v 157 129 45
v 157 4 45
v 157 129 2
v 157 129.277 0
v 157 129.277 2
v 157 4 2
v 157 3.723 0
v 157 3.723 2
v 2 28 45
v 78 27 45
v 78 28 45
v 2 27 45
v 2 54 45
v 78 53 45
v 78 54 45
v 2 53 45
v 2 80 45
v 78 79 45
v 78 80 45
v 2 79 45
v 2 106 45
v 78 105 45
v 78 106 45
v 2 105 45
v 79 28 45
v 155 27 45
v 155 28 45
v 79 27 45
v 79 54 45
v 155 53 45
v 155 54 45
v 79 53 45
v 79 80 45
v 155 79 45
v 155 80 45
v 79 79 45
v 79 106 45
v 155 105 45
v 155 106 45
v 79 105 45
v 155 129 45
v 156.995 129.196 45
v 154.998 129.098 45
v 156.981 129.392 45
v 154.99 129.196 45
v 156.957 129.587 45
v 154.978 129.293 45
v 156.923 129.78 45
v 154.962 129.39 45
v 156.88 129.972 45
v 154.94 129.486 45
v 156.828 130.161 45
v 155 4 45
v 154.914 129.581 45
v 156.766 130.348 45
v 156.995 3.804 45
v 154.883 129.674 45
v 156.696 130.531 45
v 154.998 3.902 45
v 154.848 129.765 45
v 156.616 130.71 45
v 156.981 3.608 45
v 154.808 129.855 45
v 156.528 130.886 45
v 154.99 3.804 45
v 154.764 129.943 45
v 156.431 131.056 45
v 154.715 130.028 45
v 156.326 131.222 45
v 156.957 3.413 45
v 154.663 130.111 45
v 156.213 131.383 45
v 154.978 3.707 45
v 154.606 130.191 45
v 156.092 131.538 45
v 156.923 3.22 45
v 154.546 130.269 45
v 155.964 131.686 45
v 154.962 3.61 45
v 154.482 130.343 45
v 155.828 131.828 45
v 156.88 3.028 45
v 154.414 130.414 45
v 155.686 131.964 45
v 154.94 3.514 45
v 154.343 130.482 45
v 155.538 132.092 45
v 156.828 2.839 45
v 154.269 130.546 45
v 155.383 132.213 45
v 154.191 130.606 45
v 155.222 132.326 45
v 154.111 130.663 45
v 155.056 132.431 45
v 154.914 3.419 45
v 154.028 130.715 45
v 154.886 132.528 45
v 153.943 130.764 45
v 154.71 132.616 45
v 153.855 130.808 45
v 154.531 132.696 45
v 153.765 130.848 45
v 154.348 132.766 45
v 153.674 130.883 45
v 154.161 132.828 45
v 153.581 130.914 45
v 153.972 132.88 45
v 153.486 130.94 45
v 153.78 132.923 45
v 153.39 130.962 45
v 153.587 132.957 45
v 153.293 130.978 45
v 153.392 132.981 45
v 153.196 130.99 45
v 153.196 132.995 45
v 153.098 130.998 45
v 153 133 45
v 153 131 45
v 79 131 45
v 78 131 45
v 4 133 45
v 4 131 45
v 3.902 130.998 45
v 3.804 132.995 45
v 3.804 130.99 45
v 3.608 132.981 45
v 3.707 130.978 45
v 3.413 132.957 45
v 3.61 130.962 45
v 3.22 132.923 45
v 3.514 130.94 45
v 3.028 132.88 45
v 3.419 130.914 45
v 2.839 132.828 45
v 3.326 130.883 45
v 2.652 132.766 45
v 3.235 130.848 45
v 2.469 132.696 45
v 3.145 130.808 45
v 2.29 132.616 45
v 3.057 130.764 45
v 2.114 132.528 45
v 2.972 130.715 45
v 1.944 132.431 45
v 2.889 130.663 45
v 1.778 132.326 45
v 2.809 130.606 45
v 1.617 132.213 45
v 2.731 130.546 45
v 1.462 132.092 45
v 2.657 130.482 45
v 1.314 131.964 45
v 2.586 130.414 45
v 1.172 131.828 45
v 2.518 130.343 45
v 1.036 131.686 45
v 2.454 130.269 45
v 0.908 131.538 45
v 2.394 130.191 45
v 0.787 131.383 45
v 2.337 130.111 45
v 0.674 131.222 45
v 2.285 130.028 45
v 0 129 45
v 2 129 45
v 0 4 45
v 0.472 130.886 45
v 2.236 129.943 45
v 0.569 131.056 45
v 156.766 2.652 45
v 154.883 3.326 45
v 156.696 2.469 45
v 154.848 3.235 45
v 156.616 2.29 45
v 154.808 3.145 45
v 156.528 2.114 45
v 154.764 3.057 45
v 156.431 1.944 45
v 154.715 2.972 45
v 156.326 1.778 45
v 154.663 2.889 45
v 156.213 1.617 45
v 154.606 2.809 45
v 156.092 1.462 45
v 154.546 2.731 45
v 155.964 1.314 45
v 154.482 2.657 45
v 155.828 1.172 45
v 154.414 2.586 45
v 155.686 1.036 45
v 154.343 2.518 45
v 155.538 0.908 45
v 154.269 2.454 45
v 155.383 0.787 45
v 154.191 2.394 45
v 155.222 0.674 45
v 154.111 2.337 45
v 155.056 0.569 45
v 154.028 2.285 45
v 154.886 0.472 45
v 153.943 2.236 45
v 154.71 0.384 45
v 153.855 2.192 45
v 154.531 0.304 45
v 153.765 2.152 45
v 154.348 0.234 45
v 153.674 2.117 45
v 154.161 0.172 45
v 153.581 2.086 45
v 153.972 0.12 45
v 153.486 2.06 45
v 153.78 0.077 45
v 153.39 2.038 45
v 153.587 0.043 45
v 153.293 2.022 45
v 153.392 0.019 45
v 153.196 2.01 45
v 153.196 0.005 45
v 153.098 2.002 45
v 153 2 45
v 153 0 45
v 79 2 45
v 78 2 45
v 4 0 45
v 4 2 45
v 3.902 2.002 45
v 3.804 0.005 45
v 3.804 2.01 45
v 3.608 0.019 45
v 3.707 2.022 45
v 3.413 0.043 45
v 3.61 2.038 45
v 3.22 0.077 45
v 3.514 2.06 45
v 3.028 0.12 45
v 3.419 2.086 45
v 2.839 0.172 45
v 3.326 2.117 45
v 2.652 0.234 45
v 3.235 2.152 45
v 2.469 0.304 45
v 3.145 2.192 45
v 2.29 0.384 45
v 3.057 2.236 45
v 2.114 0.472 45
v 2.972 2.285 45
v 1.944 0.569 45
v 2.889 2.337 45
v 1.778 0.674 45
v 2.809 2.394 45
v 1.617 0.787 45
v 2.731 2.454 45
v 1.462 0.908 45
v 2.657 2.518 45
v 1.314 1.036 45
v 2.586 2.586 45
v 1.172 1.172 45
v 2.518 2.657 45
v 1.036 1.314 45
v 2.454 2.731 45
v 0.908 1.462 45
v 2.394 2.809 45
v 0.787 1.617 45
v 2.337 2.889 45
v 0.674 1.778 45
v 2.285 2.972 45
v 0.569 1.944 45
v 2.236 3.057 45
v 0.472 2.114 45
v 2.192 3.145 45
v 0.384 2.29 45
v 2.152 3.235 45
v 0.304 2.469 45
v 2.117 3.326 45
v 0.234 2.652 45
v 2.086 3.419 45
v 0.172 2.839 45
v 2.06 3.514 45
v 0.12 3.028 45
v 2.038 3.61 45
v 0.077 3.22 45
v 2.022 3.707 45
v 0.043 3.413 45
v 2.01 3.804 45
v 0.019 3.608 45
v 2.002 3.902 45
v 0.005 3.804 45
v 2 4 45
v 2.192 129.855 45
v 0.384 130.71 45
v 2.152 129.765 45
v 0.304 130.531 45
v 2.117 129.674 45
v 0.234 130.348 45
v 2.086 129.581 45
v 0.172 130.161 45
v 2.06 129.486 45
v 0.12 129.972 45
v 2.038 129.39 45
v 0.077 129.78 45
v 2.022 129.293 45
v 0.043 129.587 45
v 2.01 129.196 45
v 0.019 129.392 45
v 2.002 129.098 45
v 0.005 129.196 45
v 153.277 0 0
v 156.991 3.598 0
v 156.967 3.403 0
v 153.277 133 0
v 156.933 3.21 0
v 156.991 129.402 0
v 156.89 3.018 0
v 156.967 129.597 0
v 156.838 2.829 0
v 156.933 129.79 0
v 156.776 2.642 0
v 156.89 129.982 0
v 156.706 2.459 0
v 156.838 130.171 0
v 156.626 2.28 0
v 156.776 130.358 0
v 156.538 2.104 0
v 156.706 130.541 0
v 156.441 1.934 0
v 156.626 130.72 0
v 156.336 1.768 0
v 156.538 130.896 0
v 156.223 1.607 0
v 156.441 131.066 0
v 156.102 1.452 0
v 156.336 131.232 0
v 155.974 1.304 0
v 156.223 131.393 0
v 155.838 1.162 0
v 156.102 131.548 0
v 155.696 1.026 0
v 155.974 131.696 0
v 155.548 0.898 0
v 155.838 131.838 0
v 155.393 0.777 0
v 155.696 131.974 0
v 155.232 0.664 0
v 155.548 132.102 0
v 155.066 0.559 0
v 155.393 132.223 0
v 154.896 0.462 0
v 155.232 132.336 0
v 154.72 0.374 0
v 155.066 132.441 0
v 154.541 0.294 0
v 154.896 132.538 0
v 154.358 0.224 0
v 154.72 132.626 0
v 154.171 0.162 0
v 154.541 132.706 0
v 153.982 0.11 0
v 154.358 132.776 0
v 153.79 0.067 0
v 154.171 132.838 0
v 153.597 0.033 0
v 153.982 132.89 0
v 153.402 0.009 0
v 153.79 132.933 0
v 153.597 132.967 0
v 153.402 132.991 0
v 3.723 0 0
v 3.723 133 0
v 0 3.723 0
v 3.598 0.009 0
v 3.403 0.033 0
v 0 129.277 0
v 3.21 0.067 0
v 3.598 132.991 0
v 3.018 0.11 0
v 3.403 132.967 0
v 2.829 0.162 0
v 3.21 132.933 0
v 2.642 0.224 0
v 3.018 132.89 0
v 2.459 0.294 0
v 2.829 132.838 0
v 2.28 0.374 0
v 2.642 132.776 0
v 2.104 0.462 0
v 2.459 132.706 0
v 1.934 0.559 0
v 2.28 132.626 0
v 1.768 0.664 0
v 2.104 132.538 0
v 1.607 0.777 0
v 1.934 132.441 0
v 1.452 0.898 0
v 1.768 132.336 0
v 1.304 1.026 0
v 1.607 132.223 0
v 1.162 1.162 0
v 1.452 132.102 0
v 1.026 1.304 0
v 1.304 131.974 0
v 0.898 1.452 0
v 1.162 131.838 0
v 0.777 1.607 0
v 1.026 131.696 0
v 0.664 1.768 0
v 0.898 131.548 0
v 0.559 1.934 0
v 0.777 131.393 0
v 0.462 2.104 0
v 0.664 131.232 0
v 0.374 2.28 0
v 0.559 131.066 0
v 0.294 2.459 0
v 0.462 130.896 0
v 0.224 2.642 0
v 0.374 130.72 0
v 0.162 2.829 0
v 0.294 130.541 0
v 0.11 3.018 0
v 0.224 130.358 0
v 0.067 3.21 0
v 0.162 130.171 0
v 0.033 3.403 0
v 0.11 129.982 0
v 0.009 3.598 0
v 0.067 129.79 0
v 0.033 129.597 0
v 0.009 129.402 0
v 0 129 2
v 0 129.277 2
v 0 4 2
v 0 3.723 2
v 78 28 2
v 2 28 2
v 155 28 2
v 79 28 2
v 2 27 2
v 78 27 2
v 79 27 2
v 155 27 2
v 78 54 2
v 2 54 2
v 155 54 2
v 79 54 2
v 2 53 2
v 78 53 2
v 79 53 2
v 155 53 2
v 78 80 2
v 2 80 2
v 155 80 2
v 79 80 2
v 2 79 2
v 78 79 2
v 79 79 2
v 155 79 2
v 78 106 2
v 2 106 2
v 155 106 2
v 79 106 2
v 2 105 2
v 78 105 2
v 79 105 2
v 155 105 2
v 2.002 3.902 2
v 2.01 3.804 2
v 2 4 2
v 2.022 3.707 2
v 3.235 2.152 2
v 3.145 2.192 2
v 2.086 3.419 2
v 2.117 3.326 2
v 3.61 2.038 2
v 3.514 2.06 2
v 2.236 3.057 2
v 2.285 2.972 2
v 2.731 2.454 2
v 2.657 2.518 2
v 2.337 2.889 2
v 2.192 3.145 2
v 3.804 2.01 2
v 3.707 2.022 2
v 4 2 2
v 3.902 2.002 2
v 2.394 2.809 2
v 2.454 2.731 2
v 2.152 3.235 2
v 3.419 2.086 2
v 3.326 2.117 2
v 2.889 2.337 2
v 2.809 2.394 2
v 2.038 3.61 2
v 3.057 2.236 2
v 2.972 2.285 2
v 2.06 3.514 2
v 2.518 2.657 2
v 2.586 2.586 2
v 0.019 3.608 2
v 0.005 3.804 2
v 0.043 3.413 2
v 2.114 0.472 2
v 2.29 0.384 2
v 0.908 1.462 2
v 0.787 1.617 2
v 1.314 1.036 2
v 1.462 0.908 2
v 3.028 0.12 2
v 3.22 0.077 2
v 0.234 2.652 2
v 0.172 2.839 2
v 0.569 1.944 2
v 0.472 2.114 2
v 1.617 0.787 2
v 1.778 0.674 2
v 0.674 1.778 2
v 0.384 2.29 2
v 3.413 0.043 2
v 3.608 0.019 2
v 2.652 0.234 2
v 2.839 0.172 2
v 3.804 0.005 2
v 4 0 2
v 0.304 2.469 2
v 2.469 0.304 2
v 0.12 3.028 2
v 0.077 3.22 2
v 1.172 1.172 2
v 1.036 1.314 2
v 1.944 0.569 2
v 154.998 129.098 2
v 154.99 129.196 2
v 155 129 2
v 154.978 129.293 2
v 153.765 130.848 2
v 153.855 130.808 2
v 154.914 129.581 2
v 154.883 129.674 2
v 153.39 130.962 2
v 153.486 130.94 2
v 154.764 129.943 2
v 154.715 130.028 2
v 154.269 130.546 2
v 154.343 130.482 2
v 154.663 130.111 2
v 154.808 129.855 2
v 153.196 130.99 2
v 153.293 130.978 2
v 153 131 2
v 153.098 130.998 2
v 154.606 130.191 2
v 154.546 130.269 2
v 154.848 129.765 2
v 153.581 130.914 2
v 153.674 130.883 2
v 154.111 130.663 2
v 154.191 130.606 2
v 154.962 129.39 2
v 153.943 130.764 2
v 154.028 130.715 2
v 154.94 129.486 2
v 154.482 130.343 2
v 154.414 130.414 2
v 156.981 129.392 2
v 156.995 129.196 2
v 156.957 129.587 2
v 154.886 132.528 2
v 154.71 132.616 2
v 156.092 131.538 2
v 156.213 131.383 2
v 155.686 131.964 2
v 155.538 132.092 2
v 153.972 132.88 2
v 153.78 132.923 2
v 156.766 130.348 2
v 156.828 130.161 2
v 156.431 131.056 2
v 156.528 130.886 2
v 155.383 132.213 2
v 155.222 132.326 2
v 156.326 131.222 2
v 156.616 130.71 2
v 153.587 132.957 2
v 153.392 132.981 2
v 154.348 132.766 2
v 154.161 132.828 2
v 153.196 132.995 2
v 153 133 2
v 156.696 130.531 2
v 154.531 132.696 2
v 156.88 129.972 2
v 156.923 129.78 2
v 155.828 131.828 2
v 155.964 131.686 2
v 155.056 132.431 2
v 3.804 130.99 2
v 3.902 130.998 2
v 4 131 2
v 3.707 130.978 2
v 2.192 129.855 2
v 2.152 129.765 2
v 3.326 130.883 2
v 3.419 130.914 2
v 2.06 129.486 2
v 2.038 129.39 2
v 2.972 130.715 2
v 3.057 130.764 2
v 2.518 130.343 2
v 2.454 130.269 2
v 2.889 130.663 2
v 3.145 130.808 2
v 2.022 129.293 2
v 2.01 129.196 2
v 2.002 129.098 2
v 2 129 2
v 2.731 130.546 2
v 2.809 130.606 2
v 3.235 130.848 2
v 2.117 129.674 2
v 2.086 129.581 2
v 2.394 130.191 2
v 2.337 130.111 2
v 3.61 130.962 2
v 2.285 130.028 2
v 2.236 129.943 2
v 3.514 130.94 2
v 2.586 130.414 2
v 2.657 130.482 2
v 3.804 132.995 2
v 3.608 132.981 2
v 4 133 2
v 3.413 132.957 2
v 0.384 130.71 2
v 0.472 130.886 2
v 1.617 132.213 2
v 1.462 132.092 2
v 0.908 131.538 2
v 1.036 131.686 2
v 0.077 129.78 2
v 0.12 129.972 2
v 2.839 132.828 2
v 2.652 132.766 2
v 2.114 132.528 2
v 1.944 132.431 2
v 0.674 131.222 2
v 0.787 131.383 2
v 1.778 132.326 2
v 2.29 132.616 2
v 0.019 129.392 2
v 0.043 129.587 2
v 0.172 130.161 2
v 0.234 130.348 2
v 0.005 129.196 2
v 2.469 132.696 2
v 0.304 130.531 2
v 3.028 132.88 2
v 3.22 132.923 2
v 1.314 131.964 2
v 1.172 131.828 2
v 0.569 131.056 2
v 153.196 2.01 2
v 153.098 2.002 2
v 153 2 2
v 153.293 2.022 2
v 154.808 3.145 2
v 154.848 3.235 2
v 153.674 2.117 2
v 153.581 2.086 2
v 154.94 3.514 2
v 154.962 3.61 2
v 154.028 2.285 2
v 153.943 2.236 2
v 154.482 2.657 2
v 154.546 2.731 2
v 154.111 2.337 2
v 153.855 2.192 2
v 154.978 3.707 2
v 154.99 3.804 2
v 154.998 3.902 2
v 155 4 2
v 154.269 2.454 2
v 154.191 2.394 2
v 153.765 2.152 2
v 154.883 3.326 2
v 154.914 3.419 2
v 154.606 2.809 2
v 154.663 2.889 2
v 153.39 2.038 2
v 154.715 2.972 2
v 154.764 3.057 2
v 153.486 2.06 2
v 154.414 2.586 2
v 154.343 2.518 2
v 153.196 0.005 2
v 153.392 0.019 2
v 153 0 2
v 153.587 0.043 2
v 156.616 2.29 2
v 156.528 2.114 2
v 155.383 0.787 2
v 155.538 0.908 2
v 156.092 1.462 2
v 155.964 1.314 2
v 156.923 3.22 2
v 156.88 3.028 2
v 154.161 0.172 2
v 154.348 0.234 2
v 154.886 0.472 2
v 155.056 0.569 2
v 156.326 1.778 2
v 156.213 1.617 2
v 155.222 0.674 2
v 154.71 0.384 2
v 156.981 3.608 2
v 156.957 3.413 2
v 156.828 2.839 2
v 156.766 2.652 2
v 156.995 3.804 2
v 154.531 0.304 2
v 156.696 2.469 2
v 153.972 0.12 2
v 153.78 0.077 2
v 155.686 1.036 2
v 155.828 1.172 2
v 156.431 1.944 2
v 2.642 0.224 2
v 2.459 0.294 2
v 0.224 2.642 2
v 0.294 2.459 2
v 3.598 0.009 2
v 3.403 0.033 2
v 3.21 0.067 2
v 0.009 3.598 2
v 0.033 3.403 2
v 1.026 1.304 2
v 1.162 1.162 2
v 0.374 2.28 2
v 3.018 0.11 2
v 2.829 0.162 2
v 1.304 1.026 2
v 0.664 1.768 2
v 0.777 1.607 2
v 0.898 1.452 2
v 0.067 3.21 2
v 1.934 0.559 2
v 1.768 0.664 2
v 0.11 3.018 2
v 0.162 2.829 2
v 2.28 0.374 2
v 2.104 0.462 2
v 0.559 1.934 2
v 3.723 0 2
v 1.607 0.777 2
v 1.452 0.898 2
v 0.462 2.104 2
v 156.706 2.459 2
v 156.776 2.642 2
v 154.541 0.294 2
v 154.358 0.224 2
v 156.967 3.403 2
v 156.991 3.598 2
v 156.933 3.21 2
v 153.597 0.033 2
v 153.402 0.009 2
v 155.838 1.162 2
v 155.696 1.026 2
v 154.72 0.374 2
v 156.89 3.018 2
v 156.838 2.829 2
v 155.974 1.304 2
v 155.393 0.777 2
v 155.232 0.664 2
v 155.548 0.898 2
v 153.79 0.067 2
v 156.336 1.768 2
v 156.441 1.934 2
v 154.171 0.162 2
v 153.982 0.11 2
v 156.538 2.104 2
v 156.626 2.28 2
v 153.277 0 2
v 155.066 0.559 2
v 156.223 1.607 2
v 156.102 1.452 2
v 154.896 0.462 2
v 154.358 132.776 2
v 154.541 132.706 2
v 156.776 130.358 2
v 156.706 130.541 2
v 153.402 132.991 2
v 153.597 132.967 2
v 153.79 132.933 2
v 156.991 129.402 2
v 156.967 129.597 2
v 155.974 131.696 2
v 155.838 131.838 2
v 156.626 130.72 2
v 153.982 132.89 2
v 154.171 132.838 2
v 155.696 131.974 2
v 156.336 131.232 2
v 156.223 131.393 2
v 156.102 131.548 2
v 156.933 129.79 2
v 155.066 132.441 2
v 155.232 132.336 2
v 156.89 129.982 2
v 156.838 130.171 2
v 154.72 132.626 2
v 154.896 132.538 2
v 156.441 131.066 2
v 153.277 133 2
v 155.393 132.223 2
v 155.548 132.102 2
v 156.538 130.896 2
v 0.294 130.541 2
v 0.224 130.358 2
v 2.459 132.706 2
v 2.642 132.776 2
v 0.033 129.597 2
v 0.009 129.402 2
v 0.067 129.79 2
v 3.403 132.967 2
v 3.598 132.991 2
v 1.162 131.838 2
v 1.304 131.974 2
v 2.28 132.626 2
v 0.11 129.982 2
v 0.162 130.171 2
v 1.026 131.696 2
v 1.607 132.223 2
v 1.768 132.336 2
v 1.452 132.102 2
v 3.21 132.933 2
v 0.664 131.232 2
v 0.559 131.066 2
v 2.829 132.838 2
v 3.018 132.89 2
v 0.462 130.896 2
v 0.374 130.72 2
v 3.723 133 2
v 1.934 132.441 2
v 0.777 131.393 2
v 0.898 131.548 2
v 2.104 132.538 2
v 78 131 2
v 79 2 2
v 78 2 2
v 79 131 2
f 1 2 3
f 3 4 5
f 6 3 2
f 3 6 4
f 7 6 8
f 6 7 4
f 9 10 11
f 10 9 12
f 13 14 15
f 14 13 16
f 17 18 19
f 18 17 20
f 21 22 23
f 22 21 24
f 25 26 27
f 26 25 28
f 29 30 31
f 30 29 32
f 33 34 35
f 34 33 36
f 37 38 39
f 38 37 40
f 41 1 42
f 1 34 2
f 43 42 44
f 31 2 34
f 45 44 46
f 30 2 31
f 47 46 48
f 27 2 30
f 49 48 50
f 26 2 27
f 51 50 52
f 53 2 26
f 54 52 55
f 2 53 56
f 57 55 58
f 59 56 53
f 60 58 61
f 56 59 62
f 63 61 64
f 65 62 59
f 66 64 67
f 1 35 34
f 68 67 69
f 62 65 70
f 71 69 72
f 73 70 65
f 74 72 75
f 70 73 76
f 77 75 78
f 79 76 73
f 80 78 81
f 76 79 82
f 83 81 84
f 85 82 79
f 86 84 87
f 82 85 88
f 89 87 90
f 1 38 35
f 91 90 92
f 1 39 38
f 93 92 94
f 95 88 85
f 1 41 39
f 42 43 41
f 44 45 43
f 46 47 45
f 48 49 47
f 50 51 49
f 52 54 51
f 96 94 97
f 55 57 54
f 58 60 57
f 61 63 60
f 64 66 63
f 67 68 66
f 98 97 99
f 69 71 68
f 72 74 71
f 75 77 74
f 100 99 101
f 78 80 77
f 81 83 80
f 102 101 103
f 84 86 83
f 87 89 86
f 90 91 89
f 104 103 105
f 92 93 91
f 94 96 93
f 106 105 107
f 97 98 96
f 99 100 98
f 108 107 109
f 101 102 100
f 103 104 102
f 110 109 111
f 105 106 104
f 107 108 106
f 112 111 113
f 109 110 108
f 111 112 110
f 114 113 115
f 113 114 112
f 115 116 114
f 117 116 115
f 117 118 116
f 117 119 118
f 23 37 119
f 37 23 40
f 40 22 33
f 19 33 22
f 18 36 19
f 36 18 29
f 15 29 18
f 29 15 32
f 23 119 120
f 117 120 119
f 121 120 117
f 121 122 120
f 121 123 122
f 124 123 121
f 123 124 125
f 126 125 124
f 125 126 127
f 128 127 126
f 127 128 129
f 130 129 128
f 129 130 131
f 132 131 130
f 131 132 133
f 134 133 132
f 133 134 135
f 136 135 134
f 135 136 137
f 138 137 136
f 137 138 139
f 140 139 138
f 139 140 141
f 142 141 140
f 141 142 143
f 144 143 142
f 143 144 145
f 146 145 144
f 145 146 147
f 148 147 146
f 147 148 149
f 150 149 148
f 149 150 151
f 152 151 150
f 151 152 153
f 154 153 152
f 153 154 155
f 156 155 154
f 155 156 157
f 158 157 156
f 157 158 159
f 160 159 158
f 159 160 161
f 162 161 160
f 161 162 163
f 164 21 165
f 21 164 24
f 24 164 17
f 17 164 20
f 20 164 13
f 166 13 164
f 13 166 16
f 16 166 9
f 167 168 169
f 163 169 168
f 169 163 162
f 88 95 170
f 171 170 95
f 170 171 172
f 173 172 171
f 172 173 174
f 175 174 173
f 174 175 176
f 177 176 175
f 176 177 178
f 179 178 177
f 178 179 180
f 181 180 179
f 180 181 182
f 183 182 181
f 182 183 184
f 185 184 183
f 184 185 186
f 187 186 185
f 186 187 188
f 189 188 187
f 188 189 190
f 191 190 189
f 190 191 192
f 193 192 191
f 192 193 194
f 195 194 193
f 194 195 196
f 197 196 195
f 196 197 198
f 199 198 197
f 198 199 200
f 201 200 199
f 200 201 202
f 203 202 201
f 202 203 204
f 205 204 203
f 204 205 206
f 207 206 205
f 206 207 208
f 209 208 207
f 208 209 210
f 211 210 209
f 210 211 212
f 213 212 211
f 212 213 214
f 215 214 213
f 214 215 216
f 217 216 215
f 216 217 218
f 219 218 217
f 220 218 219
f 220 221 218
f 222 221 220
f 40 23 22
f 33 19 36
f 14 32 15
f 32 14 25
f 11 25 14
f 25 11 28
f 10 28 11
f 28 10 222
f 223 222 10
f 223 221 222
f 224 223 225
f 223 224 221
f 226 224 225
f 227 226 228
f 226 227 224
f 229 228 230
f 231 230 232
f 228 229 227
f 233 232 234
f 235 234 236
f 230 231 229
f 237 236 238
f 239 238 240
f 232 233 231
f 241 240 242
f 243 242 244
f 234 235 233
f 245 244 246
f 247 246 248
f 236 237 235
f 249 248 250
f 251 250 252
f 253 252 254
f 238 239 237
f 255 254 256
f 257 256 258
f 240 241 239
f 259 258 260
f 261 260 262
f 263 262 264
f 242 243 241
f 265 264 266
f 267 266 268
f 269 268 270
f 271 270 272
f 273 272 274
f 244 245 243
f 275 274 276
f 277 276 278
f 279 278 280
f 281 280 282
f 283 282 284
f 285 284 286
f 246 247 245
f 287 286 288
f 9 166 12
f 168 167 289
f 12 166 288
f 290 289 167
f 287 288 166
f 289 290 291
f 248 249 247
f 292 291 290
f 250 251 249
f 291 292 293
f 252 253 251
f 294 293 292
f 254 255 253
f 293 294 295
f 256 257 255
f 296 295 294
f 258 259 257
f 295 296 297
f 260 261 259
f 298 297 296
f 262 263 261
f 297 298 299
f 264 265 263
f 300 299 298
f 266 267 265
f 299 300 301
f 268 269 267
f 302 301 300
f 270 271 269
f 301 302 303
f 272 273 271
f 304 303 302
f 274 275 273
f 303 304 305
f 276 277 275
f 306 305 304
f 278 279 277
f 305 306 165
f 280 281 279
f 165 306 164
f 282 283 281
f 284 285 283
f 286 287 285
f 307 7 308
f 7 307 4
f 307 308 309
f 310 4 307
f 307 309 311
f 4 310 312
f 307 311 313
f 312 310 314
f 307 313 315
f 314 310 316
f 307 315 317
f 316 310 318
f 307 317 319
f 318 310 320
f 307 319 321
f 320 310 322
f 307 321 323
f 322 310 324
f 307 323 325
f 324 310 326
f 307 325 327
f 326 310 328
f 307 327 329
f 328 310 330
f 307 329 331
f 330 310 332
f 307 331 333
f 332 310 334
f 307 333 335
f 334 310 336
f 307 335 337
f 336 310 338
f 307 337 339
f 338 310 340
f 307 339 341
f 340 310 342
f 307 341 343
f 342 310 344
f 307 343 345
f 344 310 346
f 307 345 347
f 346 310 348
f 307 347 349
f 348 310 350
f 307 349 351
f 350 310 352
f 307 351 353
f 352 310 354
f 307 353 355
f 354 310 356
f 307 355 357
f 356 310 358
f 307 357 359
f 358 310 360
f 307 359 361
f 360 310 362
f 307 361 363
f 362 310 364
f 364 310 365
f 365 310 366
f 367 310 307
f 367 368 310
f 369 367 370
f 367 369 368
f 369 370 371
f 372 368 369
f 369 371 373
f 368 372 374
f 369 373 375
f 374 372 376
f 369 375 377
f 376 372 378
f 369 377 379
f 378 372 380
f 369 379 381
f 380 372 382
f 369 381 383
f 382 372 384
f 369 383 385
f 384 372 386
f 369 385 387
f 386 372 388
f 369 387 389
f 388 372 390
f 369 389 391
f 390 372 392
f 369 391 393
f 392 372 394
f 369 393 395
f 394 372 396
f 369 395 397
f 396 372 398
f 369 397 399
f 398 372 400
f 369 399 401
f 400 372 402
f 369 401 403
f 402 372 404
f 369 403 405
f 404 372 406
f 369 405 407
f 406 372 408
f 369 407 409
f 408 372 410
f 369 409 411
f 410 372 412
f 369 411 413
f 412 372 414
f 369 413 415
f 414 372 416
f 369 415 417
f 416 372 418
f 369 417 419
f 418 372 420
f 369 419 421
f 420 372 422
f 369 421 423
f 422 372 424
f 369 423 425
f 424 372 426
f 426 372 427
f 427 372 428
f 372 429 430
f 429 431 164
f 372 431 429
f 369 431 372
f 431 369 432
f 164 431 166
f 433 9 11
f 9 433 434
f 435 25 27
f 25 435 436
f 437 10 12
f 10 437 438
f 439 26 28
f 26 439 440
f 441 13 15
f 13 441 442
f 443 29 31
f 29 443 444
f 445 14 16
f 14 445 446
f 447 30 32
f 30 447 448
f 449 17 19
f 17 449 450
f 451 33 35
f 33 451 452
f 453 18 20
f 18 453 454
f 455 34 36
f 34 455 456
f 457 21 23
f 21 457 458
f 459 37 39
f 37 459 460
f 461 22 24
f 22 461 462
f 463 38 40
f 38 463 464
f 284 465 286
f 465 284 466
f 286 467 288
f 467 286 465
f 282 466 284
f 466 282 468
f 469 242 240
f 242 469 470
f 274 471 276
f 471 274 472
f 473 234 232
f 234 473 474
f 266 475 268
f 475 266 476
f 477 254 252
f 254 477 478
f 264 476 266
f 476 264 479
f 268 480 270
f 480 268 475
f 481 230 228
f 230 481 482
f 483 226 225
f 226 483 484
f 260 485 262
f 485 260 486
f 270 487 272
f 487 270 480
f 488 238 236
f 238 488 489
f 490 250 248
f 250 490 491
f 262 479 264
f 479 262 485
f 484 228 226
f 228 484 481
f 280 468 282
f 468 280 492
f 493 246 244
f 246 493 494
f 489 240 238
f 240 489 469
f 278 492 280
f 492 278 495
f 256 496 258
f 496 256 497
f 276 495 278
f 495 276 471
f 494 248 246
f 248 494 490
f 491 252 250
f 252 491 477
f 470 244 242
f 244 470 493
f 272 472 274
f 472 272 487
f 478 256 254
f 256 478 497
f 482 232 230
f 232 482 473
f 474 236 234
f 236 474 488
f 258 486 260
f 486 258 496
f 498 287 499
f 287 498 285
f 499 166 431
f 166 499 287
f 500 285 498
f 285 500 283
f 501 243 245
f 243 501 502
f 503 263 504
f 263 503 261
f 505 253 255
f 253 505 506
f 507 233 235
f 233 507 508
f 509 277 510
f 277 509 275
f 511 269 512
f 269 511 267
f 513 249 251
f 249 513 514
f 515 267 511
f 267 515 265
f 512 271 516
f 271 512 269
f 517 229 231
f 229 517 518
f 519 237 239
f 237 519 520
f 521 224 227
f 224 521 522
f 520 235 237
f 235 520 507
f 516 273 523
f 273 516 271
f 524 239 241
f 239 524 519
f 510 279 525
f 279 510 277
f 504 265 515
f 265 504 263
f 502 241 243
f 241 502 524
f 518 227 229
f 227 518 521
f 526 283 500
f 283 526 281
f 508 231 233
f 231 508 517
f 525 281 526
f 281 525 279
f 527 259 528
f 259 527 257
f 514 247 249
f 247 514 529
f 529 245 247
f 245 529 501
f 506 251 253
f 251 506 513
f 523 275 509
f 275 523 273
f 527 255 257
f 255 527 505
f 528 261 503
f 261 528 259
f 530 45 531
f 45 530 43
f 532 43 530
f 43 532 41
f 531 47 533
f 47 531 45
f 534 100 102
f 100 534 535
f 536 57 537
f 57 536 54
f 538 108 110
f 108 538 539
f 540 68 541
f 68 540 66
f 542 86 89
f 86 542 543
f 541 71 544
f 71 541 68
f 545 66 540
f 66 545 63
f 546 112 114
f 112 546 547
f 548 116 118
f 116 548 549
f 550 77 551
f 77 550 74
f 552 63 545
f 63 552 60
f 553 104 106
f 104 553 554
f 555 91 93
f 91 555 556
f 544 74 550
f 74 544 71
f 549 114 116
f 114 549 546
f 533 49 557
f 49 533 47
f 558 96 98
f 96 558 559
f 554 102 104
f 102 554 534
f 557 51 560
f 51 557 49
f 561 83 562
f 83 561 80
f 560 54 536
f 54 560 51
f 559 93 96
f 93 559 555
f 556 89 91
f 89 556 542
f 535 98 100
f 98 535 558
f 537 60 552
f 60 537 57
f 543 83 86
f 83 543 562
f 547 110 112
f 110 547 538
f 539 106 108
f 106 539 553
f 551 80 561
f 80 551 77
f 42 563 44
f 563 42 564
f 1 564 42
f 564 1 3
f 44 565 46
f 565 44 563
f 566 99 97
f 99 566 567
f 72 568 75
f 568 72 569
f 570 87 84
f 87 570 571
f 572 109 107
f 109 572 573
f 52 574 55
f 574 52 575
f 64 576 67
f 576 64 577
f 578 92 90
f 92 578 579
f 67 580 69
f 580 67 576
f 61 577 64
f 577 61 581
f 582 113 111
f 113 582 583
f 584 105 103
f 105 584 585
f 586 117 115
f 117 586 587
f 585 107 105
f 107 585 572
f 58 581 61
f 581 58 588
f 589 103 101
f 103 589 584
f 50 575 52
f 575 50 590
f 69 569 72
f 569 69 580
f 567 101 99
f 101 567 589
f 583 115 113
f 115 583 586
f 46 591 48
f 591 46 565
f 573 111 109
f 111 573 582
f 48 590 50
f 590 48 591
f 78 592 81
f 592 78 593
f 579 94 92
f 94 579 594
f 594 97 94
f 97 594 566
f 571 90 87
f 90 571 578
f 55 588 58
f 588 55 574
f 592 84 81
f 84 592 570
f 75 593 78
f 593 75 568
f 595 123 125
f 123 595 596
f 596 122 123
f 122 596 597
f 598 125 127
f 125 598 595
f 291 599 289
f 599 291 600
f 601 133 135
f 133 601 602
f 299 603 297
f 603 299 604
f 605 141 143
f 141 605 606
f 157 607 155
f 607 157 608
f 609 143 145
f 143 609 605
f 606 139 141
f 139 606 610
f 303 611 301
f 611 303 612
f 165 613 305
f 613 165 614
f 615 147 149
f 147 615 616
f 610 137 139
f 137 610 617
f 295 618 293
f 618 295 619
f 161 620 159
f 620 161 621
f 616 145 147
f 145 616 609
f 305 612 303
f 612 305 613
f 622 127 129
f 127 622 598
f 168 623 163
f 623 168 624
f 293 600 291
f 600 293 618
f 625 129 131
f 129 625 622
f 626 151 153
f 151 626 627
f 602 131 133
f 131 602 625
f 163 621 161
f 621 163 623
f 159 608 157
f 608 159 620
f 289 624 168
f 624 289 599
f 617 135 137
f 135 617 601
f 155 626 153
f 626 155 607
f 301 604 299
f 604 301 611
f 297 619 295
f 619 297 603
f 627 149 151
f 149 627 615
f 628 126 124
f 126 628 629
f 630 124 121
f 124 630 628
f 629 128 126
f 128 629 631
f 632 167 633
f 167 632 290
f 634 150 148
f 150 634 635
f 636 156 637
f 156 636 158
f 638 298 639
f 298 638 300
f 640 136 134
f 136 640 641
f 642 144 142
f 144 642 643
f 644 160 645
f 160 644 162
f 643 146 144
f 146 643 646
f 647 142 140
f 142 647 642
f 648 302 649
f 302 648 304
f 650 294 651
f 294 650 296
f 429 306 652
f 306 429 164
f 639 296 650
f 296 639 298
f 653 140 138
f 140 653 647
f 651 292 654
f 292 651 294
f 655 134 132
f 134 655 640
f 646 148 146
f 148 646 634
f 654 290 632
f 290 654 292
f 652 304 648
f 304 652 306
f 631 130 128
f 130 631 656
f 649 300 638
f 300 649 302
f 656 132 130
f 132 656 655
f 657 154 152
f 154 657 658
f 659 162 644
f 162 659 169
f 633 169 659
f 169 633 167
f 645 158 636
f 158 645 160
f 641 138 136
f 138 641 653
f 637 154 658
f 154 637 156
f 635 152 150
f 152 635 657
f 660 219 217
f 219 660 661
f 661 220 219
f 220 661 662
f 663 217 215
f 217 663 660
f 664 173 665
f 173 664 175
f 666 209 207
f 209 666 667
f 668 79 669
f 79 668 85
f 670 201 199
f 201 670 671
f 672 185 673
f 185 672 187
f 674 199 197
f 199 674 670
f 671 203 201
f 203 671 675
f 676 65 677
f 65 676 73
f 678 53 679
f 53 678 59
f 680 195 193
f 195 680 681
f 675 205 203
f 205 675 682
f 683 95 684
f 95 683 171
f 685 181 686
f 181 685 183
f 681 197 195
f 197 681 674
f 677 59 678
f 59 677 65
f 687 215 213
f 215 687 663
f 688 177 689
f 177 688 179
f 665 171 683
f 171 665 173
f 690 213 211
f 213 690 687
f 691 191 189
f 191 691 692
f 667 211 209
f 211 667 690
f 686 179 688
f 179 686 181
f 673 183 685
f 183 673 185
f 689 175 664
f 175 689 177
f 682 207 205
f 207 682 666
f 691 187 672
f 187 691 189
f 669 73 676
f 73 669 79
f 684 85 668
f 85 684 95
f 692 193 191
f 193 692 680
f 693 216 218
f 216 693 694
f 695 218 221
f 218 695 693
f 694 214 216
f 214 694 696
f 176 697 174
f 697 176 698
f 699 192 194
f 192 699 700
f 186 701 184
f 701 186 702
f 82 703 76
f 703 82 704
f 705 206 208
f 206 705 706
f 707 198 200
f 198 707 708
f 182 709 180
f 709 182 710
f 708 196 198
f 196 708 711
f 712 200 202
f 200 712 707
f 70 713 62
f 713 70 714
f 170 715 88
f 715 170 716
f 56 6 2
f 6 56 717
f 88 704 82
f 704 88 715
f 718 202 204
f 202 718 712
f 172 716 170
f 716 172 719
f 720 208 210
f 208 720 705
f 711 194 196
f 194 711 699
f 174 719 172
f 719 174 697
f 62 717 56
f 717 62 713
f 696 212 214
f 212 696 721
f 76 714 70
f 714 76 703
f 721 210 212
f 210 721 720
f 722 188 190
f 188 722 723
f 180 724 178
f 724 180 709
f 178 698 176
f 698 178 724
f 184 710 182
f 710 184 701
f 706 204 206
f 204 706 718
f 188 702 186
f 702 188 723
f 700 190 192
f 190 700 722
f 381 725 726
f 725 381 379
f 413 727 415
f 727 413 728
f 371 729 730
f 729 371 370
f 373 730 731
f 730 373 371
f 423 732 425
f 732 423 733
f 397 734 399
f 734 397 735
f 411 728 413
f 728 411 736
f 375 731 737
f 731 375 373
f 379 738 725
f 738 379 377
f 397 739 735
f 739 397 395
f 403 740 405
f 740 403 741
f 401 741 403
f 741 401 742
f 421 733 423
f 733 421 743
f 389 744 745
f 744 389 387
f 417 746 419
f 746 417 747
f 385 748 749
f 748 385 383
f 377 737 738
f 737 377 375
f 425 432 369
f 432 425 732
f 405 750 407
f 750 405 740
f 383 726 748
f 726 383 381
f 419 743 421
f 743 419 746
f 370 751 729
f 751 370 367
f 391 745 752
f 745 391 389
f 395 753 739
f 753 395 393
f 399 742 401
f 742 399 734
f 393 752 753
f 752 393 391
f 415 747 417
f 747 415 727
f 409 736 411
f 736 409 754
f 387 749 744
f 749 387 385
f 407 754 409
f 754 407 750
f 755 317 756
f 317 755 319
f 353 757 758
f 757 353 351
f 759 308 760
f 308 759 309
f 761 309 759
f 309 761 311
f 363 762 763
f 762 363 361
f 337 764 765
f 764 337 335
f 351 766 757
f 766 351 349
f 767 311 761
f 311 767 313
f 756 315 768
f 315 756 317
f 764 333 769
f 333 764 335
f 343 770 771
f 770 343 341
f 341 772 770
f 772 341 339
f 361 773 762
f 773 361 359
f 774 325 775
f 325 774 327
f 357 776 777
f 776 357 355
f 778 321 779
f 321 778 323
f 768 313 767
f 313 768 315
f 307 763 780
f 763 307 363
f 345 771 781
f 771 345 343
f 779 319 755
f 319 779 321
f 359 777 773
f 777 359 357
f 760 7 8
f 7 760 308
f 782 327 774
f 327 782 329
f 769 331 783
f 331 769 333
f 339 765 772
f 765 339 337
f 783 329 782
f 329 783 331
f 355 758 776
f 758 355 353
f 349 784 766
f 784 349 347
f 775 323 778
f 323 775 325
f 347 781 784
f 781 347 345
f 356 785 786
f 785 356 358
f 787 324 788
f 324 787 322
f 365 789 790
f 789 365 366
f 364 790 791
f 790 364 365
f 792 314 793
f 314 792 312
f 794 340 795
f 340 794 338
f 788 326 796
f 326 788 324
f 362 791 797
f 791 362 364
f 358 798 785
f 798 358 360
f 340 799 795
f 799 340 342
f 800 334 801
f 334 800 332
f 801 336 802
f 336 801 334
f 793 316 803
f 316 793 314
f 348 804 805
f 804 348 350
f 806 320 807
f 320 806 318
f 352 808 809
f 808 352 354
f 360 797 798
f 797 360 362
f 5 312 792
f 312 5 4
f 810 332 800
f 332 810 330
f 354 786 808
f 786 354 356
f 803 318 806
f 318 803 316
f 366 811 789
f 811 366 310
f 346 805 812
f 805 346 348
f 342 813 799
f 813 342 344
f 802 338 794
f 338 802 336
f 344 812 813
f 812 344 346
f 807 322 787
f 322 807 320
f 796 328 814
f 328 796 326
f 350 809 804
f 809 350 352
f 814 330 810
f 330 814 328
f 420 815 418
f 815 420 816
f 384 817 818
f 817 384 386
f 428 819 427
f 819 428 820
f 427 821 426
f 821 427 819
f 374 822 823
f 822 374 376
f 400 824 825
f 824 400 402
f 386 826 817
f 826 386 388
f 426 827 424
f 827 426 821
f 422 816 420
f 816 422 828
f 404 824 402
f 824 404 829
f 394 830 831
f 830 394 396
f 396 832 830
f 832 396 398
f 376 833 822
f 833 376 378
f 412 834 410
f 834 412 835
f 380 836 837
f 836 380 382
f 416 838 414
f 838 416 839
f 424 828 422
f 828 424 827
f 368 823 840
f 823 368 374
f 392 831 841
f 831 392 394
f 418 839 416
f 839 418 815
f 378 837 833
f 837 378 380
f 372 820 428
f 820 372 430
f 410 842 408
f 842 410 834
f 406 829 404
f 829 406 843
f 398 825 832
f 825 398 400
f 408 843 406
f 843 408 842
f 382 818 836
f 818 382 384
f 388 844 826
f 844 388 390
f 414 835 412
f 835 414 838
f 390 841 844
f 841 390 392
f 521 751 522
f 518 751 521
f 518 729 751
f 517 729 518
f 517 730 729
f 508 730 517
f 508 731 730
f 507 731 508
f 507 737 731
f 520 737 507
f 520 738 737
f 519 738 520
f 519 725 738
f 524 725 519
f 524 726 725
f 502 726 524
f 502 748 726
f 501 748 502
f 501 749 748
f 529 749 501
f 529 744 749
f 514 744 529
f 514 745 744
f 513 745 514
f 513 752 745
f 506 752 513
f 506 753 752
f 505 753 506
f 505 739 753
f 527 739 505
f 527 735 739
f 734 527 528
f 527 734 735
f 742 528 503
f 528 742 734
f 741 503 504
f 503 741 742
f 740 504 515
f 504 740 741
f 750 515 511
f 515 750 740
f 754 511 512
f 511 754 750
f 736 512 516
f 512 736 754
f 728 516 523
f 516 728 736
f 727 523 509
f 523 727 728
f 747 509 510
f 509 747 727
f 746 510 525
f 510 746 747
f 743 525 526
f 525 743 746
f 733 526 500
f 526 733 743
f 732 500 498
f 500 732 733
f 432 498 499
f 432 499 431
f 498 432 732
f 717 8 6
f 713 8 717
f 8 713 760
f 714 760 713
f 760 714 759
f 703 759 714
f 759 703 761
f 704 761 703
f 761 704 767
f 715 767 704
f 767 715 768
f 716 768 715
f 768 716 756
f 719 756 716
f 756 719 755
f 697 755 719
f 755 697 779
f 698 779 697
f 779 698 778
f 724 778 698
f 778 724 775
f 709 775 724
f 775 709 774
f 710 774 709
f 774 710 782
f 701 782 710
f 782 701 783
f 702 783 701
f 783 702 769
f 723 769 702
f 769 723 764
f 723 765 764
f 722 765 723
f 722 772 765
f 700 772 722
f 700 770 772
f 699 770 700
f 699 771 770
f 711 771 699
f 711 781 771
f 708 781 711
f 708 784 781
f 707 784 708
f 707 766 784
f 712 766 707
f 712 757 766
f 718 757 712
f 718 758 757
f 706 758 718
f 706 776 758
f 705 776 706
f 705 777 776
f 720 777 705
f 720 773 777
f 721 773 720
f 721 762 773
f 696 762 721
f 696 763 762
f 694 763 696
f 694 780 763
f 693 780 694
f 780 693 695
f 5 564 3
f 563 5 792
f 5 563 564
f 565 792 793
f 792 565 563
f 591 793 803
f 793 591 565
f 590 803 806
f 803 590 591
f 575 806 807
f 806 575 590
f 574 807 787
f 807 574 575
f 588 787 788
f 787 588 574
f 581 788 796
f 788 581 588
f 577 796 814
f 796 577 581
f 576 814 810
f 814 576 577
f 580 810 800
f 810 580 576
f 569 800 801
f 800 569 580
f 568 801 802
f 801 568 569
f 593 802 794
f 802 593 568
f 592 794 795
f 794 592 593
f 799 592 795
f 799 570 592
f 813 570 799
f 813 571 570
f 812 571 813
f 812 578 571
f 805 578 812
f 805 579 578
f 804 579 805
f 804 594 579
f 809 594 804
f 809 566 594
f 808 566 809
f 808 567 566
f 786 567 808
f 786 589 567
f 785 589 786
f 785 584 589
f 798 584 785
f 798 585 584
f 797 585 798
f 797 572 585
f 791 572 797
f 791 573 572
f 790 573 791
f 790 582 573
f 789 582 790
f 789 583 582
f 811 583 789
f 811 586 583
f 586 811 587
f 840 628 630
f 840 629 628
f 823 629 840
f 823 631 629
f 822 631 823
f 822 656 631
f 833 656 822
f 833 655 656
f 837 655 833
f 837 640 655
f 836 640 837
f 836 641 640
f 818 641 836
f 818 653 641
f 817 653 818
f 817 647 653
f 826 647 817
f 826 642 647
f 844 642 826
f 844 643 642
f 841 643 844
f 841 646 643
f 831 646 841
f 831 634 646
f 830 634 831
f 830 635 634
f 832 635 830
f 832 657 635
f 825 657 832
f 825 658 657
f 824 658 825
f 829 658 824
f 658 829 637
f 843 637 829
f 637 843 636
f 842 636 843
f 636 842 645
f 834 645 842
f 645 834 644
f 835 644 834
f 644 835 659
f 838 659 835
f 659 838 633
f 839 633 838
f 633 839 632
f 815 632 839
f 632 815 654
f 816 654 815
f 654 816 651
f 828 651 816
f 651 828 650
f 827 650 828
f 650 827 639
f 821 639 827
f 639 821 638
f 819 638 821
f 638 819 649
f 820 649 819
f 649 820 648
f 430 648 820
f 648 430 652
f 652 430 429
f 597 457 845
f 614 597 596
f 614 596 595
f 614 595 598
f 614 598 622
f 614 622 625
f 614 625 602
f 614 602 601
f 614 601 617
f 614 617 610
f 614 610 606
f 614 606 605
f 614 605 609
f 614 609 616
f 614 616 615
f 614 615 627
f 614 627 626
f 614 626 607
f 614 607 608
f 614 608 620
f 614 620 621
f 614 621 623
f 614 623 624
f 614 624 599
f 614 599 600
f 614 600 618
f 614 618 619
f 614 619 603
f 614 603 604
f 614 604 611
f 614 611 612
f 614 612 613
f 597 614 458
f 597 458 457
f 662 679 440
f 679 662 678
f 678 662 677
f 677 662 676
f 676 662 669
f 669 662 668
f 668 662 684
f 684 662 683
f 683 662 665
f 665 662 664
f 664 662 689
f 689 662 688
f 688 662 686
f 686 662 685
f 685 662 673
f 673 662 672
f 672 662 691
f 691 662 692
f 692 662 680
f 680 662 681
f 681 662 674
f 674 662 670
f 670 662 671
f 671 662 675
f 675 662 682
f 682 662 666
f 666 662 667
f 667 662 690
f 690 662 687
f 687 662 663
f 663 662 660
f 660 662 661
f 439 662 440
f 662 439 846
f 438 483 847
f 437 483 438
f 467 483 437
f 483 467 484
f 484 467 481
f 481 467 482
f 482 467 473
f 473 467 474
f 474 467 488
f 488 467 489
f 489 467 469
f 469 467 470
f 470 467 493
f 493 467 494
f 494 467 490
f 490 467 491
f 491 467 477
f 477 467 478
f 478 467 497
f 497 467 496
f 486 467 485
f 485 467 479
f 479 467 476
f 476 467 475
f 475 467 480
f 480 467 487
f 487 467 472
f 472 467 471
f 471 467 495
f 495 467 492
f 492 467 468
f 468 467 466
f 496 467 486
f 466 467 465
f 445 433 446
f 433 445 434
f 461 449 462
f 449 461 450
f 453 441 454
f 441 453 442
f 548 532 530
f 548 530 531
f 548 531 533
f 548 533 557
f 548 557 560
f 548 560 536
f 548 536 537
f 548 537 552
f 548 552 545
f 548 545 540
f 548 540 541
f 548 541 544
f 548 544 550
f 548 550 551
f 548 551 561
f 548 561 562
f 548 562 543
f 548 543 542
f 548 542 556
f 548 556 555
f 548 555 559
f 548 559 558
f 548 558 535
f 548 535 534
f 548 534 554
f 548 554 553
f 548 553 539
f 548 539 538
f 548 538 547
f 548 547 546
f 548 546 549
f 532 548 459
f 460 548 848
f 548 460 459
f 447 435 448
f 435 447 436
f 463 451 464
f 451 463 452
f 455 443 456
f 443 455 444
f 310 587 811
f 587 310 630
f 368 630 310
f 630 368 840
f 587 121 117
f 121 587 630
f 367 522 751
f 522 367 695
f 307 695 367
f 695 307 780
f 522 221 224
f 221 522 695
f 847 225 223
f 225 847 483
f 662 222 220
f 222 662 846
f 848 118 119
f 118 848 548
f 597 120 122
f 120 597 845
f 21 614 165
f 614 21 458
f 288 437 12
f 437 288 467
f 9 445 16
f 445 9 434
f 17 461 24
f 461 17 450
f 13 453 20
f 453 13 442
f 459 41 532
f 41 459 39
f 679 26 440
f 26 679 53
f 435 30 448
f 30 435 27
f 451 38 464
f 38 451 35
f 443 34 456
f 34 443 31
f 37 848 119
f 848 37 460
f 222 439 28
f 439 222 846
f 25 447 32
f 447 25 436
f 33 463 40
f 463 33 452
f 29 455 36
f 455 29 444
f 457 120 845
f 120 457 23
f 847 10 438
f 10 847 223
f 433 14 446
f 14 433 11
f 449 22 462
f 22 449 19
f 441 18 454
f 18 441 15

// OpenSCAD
// container for cosmetics in a mirror cabinet
// holds boxes with magnetic lids in place


$fn= $preview ? 32 : 128;

// Parameters for thin lipstick
numRows = 5;          // Number of rows of holes
numCols = 2;          // Number of columns of holes
boxHeight = 45;       // Height of the box
holeWidth = 76;       // Width of each box hole
holeHeight = 25;      // Height of each box hole
outerWall = 2;        // outer wall thickness
innerWall = 1;        // inner wall thickness
roundedEdgeWidth = 4; // rounding at corners

// precomputed often used values
width = numCols * holeWidth + (numCols - 1) * innerWall + 2*outerWall;
depth = numRows * holeHeight + (numRows - 1) * innerWall + 2*outerWall;
widthStraightPart = width - 2*roundedEdgeWidth; 
depthStraightPart = depth - 2*roundedEdgeWidth; 

module roundedEdge() {
    difference() {
        cylinder(h = boxHeight, r = roundedEdgeWidth, center = false);
        translate([0, 0, -1]) {
            cylinder(h = boxHeight + 2, r = roundedEdgeWidth-outerWall, center = false);
            translate([-roundedEdgeWidth - 1, -roundedEdgeWidth - 1, 0]) {
                cube([roundedEdgeWidth + 1, 2*roundedEdgeWidth + 2, boxHeight + 2], center = false);
                cube([2*roundedEdgeWidth + 2, roundedEdgeWidth + 1, boxHeight + 2], center = false);
            }       
        }
    }
}

module roundedEdgeCutoff() {
    difference() {
        translate([0, 0, -1])
            cube([roundedEdgeWidth, roundedEdgeWidth, boxHeight+2], center = false);
        translate([roundedEdgeWidth, roundedEdgeWidth, -2])
            cylinder(h = boxHeight + 4, r = roundedEdgeWidth, center = false);       
    }
}

union() {
    // outer walls
    translate([roundedEdgeWidth, 0, 0])
        cube([widthStraightPart, outerWall, boxHeight], false);
    translate([roundedEdgeWidth, depth-outerWall, 0])
        cube([widthStraightPart, outerWall, boxHeight], false);
    translate([0, roundedEdgeWidth, 0])
        cube([outerWall, depthStraightPart, boxHeight], false);
    translate([width-outerWall, roundedEdgeWidth, 0])
        cube([outerWall, depthStraightPart, boxHeight], false);
    
    // inner walls
    for (c = [1:numCols - 1]) {
        translate([outerWall + holeWidth*c + innerWall*(c-1), 0, 0])
            cube([innerWall, depth, boxHeight]);
    }
    for (r = [1:numRows - 1]) {
        translate([0, outerWall + holeHeight*r + innerWall*(r-1), 0])
            cube([width, innerWall, boxHeight]);
    }

    // rounded edges
    translate([roundedEdgeWidth, roundedEdgeWidth, 0]) rotate([0, 0, 180]) roundedEdge();
    translate([width-roundedEdgeWidth, depth-roundedEdgeWidth, 0]) rotate([0, 0, 0]) roundedEdge();
    translate([roundedEdgeWidth, depth-roundedEdgeWidth, 0]) rotate([0, 0, 90]) roundedEdge();
    translate([width-roundedEdgeWidth, roundedEdgeWidth, 0]) rotate([0, 0, 270]) roundedEdge();

    // bottom
    difference() {
        cube([width, depth, outerWall]);
        translate([-0.01, -0.01, 0]) roundedEdgeCutoff();
        translate([width+0.01, -0.01, 0])      rotate([0, 0, 90])  roundedEdgeCutoff();
        translate([width+0.01, depth+0.01, 0]) rotate([0, 0, 180]) roundedEdgeCutoff();
        translate([-0.01, depth+0.01, 0])      rotate([0, 0, 270]) roundedEdgeCutoff();
    }
}
